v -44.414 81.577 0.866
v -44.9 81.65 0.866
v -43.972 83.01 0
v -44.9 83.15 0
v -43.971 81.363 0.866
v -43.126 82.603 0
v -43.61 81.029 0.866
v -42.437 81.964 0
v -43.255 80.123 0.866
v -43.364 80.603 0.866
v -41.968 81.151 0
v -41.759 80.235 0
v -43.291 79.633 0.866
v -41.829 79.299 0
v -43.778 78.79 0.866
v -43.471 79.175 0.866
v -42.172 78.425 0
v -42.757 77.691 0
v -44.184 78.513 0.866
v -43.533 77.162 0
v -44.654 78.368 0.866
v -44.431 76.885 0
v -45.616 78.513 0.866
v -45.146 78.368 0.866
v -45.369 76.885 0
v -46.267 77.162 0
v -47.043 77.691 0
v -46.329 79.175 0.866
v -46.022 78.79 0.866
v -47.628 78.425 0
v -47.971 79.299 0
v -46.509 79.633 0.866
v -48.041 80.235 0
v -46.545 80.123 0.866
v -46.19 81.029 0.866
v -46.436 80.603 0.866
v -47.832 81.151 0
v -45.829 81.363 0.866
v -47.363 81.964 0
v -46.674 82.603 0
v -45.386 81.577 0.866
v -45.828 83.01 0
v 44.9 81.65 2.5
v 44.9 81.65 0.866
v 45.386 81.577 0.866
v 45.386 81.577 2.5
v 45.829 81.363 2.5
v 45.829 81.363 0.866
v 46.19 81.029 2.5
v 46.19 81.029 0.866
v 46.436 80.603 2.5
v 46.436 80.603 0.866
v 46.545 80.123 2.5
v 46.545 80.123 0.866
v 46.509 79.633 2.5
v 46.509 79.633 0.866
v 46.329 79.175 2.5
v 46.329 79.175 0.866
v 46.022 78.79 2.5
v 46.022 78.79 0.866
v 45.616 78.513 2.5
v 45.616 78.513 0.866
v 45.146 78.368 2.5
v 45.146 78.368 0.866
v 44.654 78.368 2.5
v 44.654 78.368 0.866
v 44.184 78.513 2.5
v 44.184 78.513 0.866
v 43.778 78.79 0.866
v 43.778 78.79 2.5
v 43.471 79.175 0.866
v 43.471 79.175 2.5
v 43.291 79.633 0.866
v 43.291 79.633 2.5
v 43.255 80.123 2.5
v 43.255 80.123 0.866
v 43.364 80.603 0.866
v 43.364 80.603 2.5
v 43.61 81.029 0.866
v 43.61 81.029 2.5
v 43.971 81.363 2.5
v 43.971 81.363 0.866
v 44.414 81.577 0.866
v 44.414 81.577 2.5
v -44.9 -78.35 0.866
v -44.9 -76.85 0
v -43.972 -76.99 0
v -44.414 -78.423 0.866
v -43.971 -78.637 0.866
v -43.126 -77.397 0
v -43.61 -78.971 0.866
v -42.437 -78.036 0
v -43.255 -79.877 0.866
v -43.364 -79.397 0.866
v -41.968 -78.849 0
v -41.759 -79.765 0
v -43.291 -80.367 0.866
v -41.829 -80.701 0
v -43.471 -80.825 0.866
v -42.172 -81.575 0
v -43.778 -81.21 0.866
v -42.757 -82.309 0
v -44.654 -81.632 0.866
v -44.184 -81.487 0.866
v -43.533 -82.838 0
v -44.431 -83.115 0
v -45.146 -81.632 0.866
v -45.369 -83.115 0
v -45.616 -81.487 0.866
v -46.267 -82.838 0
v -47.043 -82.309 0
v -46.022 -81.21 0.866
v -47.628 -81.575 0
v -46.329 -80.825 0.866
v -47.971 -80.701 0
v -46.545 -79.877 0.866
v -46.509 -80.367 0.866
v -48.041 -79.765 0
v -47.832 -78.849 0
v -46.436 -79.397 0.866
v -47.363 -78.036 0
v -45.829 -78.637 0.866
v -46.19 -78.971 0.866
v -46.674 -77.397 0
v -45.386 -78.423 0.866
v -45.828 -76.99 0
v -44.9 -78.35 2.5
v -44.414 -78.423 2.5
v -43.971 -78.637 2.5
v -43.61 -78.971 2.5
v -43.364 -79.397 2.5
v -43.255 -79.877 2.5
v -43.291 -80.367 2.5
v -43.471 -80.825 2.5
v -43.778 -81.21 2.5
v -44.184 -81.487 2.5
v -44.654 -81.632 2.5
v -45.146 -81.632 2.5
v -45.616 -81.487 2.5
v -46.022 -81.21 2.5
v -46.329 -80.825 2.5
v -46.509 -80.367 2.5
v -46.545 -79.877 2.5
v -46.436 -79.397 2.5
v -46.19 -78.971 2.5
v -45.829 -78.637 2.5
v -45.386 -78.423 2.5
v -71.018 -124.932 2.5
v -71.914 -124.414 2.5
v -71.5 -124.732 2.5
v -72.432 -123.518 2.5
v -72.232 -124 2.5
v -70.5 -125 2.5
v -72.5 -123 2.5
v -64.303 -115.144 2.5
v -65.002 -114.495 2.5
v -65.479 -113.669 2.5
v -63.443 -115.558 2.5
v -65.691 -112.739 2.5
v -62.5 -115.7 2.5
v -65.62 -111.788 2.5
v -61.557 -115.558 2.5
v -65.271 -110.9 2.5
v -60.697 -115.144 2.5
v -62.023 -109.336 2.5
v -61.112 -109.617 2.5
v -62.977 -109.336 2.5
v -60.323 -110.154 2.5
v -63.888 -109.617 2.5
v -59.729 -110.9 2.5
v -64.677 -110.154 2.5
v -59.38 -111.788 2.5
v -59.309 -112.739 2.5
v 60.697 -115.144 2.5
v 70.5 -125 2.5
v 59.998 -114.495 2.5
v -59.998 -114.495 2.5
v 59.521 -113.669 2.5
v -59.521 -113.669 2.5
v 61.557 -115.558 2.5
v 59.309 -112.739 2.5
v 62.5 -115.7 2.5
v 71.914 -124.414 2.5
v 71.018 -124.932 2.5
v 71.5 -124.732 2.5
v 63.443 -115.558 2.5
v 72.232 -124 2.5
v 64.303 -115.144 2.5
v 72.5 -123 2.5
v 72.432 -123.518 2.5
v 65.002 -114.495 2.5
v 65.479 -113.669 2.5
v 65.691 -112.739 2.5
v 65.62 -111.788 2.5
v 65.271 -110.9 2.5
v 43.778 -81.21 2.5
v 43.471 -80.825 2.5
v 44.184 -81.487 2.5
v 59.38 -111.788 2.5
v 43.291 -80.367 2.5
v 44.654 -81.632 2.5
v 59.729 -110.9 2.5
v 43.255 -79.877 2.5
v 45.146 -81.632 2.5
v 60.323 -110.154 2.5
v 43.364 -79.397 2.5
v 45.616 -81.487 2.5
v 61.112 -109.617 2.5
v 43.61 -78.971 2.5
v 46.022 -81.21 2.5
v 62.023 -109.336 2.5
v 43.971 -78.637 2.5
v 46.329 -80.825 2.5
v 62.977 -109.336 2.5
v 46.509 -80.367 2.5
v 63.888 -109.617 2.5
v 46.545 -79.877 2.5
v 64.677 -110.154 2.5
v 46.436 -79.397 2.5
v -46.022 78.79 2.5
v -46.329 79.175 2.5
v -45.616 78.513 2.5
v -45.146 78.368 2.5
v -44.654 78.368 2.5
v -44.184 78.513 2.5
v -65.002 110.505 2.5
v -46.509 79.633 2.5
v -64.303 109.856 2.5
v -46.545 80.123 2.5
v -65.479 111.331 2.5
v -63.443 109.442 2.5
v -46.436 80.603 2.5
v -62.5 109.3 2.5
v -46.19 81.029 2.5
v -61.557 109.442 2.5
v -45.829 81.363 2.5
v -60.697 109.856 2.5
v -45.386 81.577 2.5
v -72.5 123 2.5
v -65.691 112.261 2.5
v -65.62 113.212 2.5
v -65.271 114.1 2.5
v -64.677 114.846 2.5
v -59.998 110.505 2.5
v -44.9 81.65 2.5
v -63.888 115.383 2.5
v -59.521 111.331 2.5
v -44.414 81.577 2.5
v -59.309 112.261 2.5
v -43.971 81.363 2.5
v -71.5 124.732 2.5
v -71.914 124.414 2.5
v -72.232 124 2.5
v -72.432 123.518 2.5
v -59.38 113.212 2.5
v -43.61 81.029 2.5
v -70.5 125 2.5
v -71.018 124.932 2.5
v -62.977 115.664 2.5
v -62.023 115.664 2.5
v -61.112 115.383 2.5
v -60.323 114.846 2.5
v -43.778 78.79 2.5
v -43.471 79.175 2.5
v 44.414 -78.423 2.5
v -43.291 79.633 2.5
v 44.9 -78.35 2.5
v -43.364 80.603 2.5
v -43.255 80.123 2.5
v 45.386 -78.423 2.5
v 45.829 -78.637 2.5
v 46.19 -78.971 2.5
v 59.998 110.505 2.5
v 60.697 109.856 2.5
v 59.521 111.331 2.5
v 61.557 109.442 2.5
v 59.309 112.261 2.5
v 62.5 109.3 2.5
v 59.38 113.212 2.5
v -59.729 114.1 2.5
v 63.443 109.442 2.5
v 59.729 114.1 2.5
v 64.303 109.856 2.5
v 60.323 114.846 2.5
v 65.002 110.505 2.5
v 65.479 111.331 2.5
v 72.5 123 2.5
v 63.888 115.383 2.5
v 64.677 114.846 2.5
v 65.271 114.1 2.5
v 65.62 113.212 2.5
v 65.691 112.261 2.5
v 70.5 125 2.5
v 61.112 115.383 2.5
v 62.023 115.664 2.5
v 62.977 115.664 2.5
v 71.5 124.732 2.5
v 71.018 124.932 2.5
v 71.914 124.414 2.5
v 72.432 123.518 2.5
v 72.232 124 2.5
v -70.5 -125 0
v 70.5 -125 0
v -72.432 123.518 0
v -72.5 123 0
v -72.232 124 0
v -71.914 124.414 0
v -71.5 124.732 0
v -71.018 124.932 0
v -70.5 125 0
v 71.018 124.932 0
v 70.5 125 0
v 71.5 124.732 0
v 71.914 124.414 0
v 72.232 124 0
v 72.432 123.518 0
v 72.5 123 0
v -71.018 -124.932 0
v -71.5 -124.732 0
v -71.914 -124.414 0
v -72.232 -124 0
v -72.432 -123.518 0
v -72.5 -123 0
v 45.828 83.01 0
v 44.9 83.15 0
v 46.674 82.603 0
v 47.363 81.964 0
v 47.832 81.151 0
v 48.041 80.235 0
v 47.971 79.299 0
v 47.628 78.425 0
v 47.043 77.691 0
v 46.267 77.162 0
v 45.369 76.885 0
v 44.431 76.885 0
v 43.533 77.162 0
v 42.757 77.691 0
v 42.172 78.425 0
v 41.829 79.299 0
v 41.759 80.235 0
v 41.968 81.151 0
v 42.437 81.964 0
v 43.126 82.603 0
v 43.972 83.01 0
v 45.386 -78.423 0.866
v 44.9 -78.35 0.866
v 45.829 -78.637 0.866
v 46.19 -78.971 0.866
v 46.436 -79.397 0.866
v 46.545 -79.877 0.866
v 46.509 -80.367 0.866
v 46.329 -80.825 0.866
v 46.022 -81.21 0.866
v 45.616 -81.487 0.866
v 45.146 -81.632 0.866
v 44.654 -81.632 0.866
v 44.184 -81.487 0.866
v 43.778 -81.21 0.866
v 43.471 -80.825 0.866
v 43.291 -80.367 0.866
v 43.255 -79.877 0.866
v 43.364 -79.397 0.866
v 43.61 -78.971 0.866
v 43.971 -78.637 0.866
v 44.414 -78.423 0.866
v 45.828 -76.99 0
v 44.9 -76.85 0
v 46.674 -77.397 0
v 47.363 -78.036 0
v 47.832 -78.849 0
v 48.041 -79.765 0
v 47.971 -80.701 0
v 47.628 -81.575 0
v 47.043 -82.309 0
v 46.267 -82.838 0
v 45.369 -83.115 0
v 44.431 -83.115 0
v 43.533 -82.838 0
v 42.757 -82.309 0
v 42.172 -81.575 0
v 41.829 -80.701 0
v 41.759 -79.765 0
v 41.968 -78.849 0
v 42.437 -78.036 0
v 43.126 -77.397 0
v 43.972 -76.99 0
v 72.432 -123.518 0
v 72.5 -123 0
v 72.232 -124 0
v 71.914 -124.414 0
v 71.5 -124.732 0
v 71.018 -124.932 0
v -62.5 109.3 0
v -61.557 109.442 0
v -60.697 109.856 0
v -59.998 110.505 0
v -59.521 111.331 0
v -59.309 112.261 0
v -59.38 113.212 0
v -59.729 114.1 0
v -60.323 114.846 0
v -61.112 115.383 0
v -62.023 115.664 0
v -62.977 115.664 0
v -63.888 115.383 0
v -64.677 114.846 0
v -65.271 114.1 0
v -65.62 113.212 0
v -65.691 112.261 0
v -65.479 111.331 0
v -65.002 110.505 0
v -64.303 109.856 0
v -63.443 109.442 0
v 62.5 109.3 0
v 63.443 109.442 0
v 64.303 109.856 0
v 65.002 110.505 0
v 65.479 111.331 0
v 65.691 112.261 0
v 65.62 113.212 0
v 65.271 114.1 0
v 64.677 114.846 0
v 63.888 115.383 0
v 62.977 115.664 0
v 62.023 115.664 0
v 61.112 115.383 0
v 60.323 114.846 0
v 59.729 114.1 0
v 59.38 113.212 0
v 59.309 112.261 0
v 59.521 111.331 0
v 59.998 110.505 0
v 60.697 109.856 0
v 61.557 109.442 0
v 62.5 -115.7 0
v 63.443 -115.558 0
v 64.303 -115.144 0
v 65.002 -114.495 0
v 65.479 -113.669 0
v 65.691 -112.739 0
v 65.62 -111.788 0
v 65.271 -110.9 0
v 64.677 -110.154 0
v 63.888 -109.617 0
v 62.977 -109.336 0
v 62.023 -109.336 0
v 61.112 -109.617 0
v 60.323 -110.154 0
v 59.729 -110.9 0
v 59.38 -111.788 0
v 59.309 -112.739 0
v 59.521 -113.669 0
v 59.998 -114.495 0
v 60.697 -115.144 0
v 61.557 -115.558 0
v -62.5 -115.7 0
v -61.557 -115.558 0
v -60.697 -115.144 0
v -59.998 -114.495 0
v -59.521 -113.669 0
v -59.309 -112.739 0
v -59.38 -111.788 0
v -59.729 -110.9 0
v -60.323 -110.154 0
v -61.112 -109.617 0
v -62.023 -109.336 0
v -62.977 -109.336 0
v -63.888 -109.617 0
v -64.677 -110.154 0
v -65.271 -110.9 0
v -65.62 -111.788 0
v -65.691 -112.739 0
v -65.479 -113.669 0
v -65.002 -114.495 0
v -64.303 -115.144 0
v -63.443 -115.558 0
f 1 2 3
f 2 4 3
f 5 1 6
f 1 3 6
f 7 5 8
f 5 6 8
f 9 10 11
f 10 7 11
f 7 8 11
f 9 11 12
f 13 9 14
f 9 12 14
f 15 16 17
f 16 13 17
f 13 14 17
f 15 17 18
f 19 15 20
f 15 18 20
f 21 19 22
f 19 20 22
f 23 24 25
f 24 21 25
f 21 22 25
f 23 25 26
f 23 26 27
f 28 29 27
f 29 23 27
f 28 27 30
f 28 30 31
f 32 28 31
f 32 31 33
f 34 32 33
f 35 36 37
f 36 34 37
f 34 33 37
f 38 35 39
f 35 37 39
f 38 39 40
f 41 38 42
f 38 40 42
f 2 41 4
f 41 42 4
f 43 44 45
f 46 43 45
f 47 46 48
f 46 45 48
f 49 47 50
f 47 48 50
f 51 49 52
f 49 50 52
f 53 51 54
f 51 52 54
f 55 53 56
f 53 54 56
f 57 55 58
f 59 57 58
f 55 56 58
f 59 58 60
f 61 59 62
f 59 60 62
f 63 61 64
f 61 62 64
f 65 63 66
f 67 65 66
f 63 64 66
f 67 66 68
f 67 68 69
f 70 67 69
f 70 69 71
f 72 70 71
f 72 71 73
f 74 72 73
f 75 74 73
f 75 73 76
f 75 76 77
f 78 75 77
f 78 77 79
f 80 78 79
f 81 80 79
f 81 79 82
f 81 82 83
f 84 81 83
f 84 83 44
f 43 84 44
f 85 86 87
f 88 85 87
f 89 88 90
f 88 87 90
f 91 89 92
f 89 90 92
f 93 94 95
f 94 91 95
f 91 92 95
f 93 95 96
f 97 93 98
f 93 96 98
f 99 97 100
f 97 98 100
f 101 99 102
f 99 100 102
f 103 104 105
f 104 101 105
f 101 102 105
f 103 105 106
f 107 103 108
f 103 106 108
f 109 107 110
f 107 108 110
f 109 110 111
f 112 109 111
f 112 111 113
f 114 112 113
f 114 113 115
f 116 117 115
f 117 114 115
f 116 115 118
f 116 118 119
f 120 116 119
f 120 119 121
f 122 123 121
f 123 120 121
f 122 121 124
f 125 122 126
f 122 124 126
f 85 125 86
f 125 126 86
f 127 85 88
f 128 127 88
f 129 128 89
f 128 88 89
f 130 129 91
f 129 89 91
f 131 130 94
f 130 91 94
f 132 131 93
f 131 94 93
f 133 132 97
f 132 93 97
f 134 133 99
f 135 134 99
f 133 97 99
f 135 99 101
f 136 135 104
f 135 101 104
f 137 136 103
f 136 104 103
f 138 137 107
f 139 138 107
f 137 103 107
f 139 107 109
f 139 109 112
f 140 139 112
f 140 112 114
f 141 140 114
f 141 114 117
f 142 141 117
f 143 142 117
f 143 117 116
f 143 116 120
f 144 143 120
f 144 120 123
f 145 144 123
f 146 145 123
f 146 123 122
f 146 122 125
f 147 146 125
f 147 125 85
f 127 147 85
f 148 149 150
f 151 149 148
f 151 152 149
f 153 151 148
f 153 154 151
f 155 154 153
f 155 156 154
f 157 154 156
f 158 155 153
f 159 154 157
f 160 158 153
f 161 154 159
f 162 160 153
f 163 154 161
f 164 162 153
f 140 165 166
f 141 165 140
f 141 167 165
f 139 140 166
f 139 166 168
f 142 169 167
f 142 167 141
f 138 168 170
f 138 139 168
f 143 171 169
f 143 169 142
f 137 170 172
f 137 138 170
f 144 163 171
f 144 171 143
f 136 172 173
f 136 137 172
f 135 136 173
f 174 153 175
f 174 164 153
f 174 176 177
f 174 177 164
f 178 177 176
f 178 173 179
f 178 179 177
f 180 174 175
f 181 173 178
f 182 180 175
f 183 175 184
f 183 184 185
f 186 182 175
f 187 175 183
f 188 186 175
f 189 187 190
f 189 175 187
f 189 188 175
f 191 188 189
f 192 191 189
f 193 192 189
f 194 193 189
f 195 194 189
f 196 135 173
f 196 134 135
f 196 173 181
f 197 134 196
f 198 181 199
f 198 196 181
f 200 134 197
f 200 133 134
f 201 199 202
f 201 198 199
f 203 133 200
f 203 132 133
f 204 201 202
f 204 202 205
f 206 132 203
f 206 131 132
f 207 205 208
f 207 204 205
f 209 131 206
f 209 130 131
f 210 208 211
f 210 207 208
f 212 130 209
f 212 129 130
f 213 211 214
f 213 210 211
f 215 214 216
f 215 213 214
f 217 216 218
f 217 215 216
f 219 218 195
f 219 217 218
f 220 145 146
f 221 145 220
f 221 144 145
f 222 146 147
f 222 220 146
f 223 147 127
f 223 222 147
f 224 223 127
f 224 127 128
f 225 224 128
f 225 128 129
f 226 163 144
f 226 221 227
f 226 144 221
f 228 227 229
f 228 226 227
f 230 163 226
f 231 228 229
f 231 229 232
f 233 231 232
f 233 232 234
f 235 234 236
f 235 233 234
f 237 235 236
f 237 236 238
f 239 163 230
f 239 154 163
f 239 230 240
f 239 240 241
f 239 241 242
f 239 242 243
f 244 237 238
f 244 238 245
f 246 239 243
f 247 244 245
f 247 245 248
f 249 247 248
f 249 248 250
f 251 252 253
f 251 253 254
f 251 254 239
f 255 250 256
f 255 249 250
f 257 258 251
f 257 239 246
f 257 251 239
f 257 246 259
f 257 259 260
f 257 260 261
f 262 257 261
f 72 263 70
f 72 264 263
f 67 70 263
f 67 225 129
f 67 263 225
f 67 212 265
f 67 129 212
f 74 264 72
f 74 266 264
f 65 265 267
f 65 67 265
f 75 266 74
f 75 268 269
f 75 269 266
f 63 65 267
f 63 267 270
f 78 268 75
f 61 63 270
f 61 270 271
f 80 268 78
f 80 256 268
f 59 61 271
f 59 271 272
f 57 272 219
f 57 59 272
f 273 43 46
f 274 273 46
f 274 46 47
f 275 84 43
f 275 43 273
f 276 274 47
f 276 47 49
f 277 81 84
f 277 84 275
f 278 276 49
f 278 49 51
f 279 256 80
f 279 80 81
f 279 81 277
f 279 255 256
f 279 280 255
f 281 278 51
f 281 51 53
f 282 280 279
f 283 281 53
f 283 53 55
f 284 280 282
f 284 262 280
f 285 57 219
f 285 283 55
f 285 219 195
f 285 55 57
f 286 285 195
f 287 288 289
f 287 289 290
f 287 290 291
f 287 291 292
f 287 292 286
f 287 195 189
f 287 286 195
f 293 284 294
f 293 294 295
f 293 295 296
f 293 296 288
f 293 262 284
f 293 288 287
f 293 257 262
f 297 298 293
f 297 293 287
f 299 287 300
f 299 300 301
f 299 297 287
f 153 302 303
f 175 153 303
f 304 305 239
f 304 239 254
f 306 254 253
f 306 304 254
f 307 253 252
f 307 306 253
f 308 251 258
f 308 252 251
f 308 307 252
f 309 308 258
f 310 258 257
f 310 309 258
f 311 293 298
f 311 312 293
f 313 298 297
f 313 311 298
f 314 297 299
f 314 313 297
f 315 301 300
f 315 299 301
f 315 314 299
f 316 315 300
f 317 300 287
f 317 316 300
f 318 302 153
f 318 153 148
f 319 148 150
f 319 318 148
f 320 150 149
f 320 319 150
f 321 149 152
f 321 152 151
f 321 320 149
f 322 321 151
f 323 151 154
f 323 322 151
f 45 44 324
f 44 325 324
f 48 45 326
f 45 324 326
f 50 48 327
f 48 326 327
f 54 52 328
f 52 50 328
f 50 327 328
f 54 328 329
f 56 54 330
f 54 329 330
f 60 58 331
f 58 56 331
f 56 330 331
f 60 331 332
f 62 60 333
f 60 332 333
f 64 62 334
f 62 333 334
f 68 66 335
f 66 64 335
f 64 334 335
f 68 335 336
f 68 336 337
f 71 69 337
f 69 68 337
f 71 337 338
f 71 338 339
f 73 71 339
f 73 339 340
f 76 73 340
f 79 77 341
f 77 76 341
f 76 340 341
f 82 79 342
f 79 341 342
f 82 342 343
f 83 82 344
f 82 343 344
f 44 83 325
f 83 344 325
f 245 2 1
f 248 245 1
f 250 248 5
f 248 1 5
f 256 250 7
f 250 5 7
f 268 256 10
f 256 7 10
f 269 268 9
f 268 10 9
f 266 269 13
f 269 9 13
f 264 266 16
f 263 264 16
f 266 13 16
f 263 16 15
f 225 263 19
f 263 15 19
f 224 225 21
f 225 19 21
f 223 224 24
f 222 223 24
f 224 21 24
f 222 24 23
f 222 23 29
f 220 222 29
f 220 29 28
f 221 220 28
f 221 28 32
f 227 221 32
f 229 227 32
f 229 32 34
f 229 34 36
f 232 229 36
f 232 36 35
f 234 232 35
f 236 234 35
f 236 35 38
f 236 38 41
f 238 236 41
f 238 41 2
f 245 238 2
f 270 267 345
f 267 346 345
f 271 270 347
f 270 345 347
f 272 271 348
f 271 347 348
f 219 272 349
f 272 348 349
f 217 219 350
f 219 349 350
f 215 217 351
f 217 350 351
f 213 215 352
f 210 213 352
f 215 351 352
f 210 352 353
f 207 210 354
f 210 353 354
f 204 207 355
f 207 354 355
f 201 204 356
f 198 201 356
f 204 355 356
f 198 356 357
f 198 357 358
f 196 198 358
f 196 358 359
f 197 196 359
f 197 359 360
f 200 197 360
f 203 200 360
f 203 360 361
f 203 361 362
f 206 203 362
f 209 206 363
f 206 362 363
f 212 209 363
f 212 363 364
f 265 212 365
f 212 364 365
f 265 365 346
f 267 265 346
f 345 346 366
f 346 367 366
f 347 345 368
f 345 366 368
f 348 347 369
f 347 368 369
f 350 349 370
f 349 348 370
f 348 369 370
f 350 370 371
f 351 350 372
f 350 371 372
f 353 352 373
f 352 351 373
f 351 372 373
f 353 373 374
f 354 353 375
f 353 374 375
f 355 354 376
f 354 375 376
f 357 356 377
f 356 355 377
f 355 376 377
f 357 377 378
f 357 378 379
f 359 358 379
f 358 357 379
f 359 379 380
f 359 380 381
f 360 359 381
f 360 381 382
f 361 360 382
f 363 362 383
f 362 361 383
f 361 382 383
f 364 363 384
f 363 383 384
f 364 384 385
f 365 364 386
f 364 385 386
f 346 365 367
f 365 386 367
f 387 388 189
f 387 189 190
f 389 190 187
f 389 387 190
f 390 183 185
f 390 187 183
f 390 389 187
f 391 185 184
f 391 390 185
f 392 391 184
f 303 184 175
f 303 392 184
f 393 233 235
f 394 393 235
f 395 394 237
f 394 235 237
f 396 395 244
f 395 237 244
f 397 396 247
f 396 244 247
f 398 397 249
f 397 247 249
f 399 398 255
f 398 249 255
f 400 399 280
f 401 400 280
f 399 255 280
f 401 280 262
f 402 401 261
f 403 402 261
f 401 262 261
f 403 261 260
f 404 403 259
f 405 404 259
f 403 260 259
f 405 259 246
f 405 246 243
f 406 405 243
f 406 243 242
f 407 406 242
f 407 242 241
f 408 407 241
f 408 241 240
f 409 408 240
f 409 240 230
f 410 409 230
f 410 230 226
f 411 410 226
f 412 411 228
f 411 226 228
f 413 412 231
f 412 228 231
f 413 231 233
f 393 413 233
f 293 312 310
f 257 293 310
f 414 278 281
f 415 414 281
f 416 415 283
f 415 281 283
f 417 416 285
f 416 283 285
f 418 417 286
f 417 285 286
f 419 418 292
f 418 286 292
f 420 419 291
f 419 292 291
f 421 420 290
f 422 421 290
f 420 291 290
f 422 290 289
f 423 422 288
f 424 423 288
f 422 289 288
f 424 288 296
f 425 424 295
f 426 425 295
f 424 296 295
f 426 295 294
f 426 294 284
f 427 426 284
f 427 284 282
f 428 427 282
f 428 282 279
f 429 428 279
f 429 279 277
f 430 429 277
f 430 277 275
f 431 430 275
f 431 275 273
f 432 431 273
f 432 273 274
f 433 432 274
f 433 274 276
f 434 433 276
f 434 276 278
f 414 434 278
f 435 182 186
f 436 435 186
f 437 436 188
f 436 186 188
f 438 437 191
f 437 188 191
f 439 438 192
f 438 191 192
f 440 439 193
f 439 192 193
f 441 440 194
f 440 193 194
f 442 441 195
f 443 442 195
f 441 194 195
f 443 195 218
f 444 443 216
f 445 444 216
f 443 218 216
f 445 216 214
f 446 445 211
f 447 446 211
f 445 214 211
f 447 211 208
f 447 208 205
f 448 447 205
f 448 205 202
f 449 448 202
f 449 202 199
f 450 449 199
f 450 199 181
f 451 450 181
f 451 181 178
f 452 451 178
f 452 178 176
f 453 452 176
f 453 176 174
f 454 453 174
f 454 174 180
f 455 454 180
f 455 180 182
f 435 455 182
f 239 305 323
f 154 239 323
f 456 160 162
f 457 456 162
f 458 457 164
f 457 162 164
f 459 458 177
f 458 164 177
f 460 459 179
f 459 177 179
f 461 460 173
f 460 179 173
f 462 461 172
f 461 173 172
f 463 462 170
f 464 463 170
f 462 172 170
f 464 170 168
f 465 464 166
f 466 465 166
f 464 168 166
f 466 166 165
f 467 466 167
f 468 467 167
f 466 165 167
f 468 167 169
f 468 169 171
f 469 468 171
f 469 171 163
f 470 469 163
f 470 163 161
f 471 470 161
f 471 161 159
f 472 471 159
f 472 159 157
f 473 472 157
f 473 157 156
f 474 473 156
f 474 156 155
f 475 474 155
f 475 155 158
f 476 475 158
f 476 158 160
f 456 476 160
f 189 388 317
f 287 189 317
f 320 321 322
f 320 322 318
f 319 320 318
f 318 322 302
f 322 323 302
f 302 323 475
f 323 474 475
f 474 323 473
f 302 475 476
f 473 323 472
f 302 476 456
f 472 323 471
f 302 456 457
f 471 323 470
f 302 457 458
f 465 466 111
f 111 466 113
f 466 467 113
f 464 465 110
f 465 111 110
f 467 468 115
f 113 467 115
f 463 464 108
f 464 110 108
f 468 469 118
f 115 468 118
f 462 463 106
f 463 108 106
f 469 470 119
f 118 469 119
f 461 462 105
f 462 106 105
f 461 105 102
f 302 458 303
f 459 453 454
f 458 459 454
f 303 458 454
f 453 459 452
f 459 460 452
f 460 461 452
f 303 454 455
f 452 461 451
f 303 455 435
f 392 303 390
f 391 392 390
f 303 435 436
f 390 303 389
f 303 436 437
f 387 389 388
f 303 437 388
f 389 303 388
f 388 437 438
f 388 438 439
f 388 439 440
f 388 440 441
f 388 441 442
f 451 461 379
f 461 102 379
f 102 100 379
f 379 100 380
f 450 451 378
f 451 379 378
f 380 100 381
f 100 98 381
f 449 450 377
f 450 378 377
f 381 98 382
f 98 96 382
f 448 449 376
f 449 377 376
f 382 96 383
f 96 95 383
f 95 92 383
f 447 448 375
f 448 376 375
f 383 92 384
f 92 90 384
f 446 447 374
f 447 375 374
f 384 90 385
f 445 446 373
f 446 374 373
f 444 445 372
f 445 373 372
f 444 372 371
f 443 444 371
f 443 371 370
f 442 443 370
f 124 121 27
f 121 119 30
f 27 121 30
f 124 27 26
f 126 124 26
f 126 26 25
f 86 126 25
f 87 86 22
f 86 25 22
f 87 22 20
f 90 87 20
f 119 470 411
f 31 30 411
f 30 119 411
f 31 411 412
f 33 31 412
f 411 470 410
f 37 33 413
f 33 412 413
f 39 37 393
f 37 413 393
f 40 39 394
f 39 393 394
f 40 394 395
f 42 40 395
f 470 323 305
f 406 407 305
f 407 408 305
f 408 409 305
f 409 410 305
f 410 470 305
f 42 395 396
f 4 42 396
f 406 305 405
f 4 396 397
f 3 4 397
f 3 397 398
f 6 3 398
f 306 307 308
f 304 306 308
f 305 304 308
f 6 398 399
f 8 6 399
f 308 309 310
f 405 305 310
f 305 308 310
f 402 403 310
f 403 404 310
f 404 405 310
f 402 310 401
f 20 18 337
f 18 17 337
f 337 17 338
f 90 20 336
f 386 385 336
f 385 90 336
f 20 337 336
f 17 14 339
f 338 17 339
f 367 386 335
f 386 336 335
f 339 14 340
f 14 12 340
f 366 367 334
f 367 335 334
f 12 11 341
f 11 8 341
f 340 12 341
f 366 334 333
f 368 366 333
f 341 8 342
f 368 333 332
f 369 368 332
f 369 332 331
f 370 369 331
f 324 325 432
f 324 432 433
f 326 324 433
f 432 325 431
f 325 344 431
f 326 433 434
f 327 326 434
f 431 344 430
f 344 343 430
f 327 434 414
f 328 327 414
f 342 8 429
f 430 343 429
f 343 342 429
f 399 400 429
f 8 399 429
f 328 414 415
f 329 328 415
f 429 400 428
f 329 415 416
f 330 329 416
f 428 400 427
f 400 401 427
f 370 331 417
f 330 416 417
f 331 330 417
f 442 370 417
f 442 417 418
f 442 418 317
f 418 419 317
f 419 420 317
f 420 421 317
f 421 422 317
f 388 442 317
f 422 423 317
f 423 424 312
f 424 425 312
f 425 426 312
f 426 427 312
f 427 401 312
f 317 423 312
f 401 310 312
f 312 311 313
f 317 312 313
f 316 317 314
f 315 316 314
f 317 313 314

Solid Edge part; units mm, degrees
sketch "Sketch1" plane through (0, 0, 0) normal (0, 0, 1) x (1, 0, 0)
  line L0 (-70.5, -125) -> (70.5, -125)
  arc A0 (70.5, -125) -> (72.5, -123) centre (70.5, -123) ccw
  line L1 (72.5, -123) -> (72.5, 123)
  arc A1 (72.5, 123) -> (70.5, 125) centre (70.5, 123) ccw
  line L2 (70.5, 125) -> (-70.5, 125)
  arc A2 (-70.5, 125) -> (-72.5, 123) centre (-70.5, 123) ccw
  line L3 (-72.5, 123) -> (-72.5, -123)
  arc A3 (-70.5, -125) -> (-72.5, -123) centre (-70.5, -123) cw
extrude "Extrusionsausprägung_1" add sketch "Sketch1" along normal blind 2.5
hole "Bohrung_1" at (-44.9, -80, 0) direction (0, 0, 1) diameter 3.3 end up to next countersink diameter 6.3 countersink angle 120
hole "Hole1" at (44.9, -80, 0) direction (0, 0, 1) diameter 3.3 end up to next countersink diameter 6.3 countersink angle 120
hole "Hole2" at (-44.9, 80, 0) direction (0, 0, 1) diameter 3.3 end up to next countersink diameter 6.3 countersink angle 120
hole "Hole3" at (44.9, 80, 0) direction (0, 0, 1) diameter 3.3 end up to next countersink diameter 6.3 countersink angle 120
hole "Bohrung_5" at (-62.5, 112.5, 2.5) direction (0, 0, -1) diameter 6.4 end up to next
hole "Hole4" at (62.5, 112.5, 2.5) direction (0, 0, -1) diameter 6.4 end up to next
hole "Hole5" at (62.5, -112.5, 2.5) direction (0, 0, -1) diameter 6.4 end up to next
hole "Hole6" at (-62.5, -112.5, 2.5) direction (0, 0, -1) diameter 6.4 end up to next
properties material "Aluminium, 2024-T4"
